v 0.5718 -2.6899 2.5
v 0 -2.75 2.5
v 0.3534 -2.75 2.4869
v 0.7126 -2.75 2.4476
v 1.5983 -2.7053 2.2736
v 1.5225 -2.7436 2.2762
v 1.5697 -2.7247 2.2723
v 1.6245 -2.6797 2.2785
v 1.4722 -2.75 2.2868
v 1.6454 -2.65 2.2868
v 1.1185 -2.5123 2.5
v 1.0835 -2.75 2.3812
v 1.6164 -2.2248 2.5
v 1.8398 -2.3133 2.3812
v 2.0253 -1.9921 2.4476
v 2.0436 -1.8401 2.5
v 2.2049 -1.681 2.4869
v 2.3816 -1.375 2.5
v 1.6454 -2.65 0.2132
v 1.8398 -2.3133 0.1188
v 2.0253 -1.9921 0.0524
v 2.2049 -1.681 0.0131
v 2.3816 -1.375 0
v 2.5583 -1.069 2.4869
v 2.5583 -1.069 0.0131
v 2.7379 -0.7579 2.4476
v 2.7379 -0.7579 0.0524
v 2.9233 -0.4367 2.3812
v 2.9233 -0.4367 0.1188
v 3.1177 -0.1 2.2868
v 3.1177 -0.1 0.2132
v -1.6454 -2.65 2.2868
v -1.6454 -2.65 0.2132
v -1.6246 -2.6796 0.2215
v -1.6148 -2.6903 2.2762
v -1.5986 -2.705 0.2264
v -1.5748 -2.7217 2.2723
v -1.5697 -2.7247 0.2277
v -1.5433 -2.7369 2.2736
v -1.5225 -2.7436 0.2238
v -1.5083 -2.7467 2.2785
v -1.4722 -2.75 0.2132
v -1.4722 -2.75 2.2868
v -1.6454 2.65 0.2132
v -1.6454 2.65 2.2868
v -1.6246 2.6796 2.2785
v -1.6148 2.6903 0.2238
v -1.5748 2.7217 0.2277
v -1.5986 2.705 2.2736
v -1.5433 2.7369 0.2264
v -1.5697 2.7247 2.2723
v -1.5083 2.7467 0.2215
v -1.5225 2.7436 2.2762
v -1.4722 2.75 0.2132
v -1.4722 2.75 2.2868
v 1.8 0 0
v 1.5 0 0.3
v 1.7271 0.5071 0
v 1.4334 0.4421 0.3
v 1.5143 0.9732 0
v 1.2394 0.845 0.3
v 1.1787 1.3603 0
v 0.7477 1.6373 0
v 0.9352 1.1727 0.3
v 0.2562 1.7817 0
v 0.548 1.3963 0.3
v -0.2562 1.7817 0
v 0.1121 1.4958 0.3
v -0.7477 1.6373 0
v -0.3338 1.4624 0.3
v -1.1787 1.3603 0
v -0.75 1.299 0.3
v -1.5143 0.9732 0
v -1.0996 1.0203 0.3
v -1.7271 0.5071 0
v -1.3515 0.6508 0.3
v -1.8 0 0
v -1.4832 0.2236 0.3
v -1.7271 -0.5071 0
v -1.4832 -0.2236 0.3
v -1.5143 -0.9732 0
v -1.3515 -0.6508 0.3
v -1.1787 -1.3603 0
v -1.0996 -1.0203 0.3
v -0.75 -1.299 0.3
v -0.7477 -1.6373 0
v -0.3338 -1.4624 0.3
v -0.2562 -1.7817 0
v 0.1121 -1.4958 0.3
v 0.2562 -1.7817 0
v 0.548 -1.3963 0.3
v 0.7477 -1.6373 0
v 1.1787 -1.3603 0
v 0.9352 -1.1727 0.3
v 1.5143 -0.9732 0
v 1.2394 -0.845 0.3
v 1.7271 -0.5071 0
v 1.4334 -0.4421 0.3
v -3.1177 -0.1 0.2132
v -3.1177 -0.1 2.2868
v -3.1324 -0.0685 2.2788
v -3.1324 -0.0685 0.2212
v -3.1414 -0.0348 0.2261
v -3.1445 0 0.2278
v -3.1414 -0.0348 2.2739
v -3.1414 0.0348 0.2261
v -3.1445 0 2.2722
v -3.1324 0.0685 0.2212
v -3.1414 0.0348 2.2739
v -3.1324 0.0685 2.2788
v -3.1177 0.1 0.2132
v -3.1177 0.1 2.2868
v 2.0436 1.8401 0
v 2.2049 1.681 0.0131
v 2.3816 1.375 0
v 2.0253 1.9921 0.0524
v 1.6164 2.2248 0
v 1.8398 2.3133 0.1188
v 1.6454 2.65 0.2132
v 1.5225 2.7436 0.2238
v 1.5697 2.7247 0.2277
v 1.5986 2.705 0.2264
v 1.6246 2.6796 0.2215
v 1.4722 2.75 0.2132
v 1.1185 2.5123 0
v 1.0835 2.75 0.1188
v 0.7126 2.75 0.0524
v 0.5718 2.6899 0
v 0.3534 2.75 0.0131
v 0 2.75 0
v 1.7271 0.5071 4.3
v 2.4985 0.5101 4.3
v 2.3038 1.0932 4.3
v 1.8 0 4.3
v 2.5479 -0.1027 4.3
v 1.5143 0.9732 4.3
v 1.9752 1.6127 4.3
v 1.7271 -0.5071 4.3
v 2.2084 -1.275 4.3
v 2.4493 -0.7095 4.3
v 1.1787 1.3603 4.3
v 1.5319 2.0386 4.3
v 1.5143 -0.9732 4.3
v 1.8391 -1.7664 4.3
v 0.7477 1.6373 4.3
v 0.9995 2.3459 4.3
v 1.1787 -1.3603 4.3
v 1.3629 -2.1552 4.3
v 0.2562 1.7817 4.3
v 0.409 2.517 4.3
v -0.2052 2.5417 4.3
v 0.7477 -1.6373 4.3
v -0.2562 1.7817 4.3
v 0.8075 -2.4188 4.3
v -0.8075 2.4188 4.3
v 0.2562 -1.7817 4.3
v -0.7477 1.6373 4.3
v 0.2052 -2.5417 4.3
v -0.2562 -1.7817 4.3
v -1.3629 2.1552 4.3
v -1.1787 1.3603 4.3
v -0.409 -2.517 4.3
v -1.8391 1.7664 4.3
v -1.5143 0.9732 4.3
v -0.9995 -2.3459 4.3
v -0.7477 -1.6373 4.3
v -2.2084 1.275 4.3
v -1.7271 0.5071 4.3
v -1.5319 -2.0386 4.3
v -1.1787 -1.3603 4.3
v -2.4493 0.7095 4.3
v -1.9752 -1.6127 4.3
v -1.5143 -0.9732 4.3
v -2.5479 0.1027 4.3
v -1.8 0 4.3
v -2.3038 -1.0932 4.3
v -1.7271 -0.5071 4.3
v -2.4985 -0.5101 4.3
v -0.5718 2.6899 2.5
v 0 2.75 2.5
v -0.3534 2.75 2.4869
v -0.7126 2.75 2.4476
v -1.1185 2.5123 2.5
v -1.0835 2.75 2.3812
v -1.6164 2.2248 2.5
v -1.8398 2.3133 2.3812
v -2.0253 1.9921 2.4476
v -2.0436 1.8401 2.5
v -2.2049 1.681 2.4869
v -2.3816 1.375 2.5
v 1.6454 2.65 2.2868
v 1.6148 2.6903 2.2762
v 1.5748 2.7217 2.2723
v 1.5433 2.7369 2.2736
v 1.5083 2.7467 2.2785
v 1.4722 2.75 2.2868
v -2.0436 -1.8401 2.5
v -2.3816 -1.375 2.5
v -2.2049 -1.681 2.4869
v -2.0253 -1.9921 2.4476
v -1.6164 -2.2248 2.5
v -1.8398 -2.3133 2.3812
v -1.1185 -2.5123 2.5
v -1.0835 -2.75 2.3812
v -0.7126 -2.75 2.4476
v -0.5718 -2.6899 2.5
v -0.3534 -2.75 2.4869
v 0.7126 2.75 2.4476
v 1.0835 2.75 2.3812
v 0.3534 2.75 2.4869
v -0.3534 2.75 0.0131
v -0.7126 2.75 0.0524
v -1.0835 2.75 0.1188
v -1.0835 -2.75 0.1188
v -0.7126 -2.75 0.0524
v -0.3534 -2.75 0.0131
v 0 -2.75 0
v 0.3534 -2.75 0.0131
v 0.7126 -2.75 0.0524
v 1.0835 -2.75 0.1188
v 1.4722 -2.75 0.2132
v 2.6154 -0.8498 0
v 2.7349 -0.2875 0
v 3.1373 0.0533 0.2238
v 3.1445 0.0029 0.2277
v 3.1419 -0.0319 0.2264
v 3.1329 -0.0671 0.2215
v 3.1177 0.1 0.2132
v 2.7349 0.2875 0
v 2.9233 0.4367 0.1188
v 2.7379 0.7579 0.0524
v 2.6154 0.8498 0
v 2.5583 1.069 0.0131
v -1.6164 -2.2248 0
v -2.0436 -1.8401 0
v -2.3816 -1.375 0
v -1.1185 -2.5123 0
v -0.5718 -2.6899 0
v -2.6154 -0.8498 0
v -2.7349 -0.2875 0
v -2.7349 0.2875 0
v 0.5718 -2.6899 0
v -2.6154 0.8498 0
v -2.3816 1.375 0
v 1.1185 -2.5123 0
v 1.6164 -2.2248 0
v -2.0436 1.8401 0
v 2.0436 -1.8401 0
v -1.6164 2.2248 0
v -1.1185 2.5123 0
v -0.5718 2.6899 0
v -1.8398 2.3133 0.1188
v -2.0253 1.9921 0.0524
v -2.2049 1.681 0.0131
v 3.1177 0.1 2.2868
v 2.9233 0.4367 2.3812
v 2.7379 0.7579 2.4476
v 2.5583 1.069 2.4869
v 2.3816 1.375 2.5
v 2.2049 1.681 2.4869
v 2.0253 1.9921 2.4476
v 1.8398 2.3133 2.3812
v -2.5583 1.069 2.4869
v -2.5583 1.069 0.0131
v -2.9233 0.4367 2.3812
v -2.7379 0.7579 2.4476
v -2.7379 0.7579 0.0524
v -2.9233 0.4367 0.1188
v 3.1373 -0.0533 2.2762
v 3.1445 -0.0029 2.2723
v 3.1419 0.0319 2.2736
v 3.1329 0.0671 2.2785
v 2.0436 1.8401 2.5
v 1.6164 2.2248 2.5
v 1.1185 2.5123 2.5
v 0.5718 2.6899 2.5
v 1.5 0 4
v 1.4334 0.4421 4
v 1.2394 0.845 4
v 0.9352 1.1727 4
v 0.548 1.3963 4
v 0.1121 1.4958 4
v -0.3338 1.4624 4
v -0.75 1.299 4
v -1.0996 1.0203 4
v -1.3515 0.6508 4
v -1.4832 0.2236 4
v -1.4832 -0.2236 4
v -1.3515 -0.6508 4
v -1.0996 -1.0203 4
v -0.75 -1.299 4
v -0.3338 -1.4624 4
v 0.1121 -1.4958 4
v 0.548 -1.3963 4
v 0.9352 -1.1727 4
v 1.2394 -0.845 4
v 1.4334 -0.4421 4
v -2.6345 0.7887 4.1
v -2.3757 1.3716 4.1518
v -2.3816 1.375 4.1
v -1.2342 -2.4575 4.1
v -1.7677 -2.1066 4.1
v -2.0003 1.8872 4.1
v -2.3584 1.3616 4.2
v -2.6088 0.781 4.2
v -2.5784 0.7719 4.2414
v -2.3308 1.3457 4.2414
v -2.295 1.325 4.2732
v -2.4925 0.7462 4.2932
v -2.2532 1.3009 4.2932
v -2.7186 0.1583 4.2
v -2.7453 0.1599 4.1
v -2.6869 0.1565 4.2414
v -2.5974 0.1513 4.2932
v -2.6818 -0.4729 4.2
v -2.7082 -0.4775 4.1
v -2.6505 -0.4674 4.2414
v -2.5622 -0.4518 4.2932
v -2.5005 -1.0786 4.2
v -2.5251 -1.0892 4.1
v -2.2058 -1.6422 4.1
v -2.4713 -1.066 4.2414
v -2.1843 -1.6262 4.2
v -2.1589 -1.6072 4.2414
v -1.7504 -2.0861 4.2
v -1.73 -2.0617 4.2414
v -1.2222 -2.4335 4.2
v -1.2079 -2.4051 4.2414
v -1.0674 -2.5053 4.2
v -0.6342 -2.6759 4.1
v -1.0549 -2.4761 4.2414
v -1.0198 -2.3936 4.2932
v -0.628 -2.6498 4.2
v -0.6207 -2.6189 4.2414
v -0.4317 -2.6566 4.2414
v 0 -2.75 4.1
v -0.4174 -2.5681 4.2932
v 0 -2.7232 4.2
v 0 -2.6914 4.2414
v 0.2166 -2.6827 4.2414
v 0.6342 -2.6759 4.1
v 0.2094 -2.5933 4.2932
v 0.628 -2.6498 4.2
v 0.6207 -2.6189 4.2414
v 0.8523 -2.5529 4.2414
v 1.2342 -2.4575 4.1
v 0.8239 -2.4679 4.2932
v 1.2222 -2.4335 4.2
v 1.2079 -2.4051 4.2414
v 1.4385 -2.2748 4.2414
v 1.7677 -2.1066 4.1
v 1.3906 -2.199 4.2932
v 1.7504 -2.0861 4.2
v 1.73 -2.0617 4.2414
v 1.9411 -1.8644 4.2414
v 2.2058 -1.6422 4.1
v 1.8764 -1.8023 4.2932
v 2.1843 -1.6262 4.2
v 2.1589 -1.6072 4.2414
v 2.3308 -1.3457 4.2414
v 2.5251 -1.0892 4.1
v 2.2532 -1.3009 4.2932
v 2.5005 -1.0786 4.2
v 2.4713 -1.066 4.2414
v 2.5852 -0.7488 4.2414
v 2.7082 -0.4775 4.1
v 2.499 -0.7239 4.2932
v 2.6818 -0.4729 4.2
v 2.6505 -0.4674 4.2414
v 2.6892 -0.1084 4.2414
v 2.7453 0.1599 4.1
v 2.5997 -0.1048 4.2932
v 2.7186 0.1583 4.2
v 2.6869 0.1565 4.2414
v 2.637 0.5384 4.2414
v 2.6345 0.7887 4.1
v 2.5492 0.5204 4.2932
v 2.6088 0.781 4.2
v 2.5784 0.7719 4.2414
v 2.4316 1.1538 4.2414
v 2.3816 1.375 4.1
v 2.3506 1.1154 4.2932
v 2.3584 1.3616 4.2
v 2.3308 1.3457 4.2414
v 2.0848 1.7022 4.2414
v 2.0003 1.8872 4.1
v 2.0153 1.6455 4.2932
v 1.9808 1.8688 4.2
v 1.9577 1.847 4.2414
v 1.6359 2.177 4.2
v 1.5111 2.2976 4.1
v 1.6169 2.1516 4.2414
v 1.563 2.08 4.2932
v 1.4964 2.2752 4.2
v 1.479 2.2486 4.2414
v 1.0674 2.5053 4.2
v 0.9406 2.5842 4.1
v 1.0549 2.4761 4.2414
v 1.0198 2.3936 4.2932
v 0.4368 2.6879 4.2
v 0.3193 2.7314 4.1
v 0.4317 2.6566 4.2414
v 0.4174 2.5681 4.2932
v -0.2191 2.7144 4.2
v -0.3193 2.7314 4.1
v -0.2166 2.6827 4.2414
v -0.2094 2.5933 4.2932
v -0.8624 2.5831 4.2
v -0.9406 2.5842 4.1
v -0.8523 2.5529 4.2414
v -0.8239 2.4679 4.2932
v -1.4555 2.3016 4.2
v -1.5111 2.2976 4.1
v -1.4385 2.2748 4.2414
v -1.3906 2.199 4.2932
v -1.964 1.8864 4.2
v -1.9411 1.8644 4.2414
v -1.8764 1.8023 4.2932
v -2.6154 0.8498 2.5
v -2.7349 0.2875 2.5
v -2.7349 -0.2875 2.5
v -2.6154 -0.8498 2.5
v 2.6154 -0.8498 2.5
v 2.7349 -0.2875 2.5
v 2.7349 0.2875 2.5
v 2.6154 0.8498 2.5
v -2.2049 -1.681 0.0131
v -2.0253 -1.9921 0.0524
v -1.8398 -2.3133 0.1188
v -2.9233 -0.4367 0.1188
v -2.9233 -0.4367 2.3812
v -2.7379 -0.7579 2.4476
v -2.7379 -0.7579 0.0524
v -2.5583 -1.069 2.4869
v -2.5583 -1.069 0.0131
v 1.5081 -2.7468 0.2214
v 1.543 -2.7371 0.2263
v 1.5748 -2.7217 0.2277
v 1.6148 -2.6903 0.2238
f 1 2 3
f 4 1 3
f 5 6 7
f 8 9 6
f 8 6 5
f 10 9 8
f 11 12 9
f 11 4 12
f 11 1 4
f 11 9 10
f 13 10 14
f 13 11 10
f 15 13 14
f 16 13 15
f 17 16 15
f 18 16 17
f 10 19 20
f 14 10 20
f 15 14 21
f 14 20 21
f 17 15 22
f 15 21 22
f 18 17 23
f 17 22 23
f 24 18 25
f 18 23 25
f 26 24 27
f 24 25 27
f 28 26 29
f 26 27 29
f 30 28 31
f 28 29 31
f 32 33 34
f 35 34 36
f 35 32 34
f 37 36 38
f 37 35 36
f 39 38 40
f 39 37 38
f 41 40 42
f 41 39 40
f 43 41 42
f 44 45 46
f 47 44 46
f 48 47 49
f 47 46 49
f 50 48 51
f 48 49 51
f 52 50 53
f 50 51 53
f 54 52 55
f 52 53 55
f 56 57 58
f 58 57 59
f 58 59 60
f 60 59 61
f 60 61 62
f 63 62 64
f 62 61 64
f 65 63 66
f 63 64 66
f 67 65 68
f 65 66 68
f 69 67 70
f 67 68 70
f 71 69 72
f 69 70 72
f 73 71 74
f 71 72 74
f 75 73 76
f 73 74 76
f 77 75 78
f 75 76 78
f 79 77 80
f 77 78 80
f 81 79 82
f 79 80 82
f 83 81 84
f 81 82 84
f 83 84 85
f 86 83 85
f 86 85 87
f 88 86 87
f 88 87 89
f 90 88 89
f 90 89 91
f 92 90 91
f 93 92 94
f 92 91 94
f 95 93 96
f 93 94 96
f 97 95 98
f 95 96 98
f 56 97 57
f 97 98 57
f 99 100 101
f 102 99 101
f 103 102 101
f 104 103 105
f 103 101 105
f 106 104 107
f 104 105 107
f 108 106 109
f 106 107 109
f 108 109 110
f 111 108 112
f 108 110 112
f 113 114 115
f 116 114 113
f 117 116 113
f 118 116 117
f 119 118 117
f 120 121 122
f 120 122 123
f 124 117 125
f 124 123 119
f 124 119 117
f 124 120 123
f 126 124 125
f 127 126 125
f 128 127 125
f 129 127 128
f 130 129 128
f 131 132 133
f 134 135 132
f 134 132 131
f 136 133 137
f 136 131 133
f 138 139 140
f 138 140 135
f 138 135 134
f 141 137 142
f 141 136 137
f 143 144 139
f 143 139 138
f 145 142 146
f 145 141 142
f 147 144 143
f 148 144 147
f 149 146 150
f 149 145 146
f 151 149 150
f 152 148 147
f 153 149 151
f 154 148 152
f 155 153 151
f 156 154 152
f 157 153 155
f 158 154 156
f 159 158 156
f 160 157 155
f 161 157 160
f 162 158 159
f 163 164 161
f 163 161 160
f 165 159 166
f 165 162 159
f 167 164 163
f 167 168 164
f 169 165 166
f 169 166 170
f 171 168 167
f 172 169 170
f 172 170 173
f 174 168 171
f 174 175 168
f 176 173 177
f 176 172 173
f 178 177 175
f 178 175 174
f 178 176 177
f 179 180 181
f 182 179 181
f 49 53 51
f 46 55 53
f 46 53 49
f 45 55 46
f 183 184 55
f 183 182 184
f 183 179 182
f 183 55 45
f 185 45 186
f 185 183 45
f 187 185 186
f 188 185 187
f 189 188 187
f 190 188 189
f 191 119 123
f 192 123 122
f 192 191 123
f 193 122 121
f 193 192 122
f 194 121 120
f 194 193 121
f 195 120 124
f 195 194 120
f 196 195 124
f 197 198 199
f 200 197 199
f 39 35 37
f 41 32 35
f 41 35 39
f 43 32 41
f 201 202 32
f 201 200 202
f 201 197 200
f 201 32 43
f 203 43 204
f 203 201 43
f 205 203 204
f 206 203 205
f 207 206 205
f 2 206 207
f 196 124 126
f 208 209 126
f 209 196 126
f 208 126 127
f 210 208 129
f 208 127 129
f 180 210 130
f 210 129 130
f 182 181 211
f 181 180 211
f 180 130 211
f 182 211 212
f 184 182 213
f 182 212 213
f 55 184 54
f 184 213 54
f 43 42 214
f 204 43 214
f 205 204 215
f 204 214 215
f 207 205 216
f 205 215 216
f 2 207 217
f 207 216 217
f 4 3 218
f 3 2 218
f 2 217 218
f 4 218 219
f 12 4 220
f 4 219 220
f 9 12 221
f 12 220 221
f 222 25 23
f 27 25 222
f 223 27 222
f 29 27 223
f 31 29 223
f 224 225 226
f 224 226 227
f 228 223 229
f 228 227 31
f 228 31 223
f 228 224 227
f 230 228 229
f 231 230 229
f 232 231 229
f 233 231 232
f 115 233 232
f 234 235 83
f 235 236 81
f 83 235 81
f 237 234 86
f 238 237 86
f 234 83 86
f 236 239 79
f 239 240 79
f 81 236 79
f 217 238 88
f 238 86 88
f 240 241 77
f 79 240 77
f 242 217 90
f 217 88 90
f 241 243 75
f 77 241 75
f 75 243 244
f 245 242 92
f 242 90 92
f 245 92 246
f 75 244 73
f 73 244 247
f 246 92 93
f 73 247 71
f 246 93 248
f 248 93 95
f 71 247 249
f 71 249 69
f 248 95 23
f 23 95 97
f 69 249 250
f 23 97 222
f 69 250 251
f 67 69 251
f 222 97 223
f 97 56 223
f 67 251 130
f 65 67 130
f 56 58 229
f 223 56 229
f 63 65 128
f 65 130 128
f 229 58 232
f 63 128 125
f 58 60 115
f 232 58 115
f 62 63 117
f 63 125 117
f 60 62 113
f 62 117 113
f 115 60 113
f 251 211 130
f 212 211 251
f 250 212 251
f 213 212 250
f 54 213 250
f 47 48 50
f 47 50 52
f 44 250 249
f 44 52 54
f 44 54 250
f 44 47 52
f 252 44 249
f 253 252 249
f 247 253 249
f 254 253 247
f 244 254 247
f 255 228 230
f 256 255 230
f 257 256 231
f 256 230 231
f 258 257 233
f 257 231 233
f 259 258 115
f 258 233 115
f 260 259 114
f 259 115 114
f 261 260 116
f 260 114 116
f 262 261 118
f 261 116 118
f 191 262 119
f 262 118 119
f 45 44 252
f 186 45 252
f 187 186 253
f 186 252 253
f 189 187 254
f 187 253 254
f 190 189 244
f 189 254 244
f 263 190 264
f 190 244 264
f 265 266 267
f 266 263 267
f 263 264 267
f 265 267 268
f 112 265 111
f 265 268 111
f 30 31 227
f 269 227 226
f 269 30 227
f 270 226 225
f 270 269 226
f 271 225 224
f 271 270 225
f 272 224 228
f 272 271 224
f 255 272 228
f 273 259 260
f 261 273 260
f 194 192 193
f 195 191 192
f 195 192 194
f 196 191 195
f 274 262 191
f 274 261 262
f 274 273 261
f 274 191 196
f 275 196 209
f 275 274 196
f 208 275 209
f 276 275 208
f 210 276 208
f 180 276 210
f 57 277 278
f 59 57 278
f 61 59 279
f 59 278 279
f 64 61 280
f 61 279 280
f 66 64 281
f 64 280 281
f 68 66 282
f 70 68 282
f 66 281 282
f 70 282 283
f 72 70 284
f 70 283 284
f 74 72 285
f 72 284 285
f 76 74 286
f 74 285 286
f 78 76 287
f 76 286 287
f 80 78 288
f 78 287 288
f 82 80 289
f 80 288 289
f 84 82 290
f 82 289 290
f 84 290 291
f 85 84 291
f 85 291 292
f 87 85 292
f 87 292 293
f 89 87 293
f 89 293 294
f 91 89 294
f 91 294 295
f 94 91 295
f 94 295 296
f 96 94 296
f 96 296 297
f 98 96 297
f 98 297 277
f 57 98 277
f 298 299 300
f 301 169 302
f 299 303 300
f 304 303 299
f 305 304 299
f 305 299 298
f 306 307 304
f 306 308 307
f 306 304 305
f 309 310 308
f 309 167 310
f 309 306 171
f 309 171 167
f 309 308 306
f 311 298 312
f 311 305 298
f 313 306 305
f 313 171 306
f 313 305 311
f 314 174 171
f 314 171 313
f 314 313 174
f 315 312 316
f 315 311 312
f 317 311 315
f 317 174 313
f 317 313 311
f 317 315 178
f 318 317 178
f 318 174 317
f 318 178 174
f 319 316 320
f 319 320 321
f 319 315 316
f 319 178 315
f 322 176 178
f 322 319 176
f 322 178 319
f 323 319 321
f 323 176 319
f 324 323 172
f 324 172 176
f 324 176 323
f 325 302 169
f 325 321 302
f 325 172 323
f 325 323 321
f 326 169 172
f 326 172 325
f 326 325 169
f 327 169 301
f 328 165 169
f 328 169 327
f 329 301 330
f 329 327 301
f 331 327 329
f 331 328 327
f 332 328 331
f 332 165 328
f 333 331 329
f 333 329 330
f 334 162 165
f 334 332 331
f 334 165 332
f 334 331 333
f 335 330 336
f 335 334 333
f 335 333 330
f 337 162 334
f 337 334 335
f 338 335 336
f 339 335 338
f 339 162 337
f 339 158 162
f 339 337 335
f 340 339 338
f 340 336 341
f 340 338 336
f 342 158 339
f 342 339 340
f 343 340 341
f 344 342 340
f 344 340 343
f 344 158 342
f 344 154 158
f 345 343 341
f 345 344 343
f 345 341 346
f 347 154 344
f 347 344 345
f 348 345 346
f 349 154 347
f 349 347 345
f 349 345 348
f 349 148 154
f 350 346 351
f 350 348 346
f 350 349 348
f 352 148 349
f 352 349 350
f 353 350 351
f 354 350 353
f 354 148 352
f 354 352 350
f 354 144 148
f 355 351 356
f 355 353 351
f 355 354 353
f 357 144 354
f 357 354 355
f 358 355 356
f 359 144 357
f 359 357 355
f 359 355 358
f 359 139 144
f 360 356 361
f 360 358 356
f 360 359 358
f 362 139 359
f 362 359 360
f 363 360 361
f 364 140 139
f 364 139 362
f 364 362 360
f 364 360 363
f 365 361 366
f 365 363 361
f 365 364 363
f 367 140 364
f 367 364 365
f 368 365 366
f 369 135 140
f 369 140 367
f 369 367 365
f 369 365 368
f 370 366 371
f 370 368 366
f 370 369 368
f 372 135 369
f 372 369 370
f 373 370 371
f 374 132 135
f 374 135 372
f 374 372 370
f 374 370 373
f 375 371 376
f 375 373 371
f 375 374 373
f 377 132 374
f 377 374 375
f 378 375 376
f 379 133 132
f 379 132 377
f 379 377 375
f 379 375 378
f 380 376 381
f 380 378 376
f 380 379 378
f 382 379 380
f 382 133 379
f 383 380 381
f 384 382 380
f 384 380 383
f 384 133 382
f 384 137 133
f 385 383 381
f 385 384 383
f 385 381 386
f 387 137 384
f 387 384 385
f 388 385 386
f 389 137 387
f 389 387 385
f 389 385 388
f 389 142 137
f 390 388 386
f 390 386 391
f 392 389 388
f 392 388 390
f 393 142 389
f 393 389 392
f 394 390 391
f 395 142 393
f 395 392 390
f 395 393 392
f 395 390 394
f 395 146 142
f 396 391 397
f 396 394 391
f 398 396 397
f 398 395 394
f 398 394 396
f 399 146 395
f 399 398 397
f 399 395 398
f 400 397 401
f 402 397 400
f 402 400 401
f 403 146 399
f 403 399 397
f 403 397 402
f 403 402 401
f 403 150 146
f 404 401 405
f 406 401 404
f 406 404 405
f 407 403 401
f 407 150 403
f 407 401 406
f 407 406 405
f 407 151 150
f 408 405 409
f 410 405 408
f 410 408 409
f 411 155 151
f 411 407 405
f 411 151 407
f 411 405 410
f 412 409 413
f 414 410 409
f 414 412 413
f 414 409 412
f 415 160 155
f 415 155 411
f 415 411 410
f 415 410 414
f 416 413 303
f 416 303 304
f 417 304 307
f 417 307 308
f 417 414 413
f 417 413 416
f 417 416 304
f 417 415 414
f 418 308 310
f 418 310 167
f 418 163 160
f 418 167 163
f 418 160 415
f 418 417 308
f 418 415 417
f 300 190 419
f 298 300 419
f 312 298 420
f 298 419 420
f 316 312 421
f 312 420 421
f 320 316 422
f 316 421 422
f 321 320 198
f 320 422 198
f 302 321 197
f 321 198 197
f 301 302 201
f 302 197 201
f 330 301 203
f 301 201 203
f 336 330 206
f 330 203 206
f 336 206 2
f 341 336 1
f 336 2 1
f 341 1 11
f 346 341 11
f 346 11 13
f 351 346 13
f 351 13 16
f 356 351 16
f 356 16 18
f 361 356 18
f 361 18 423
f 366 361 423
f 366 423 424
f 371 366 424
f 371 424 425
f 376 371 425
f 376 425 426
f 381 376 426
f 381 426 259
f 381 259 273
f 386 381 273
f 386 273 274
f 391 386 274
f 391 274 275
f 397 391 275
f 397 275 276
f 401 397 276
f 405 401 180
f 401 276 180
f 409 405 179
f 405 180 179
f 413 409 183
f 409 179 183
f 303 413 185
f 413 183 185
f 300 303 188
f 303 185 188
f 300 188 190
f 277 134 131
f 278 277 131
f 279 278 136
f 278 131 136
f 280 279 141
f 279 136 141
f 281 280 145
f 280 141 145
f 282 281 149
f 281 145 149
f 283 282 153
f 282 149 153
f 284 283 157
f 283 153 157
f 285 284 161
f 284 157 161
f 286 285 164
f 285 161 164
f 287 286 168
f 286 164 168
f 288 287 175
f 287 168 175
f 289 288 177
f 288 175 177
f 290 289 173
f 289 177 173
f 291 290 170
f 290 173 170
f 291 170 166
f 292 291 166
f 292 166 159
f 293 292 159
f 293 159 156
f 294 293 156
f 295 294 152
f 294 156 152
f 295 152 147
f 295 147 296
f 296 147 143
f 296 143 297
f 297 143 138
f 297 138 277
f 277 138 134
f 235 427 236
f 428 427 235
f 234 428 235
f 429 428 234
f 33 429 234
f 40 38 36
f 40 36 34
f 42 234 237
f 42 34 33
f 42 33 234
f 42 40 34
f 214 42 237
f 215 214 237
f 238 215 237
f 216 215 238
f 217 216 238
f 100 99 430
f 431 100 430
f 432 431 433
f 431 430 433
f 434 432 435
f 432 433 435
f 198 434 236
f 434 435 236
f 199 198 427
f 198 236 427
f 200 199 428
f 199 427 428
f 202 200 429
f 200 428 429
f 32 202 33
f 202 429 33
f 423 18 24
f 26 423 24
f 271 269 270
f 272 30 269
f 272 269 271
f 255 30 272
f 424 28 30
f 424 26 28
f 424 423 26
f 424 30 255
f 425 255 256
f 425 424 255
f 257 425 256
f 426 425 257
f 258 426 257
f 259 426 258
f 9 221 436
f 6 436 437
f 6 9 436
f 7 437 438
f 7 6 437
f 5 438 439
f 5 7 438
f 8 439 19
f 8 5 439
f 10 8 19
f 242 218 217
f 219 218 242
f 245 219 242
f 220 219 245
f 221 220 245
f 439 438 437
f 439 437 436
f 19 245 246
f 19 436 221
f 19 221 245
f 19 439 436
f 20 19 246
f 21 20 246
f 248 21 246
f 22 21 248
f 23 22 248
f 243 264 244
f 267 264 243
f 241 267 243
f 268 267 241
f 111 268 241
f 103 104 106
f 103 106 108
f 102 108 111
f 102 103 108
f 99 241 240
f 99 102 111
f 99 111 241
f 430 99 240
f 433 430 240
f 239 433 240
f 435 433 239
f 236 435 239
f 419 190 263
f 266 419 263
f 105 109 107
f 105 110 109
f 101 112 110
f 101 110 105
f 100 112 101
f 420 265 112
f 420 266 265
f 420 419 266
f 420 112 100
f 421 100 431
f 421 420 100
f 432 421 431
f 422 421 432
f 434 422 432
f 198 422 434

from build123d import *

# Parameters (mm, degrees)
EXTRUDE_307_DEPTH     = 2.5
SKETCH_2_R            = 2.75
EXTRUDE_489_DEPTH     = 1.8
SKETCH_3_R            = 1.5
CUT_EXTRUDE_587_DEPTH = 7.011308787
FILLET_2_R            = 0.2
CHAMFER_1_SIZE        = 0.3
CHAMFER_2_SIZE        = 0.3
FILLET_3_R            = 0.2


with BuildPart() as part:
    # 草图1 → Extrude 307 (new body)
    with BuildSketch(Plane.XY):
        Polygon((3.175426481, 0), (1.58771324, 2.75), (-1.58771324, 2.75), (-3.175426481, 0), (-1.58771324, -2.75), (1.58771324, -2.75), align=None)
    extrude(amount=EXTRUDE_307_DEPTH)

    # 草图2 → Extrude 489 (add)
    with BuildSketch(Plane.XY.offset(2.5)):
        with Locations(Location((0, 0, 0), (0, 0, 150))):
            Circle(SKETCH_2_R)
    extrude(amount=EXTRUDE_489_DEPTH)

    # 草图3 → Cut-Extrude 587 (cut, through all)
    with BuildSketch(Plane.XY.offset(4.3)):
        Circle(SKETCH_3_R)
    extrude(amount=-CUT_EXTRUDE_587_DEPTH, mode=Mode.SUBTRACT)

    # 圆角2
    fillet_2_edges = [part.edges().sort_by_distance(p)[0] for p in [
        (1.58771324, -2.75, 1.25),
        (-1.58771324, -2.75, 1.25),
        (-3.175426481, 0, 1.25),
        (-1.58771324, 2.75, 1.25),
        (1.58771324, 2.75, 1.25),
        (3.175426481, 0, 1.25),
    ]]
    fillet(fillet_2_edges, radius=FILLET_2_R)

    # 倒角1
    chamfer_1_edges = [part.edges().sort_by_distance(p)[0] for p in [
        (-1.5, 0, 0),
    ]]
    chamfer(chamfer_1_edges, length=CHAMFER_1_SIZE)

    # 倒角2
    chamfer_2_edges = [part.edges().sort_by_distance(p)[0] for p in [
        (-1.5, 0, 4.3),
    ]]
    chamfer(chamfer_2_edges, length=CHAMFER_2_SIZE)

    # 草图6 → 切除-旋转2 (revolve, cut)
    with BuildSketch(Plane(origin=(0, 0, 0), x_dir=(1, 0, 0), z_dir=(0, 1, 0))):
        Polygon((-2.75, 0), (-3.144486373, -0.227756814), (-3.144486373, 0), align=None)
        Polygon((-3.144486373, -2.5), (-3.144486373, -2.272243186), (-2.75, -2.5), align=None)
    revolve(axis=Axis((0, 0, -1.923239397), (0, 0, 1)), mode=Mode.SUBTRACT)

    # 圆角3
    fillet_3_edges = [part.edges().sort_by_distance(p)[0] for p in [
        (2.38156986, -1.375, 4.3),
    ]]
    fillet(fillet_3_edges, radius=FILLET_3_R)


solid = part.part
